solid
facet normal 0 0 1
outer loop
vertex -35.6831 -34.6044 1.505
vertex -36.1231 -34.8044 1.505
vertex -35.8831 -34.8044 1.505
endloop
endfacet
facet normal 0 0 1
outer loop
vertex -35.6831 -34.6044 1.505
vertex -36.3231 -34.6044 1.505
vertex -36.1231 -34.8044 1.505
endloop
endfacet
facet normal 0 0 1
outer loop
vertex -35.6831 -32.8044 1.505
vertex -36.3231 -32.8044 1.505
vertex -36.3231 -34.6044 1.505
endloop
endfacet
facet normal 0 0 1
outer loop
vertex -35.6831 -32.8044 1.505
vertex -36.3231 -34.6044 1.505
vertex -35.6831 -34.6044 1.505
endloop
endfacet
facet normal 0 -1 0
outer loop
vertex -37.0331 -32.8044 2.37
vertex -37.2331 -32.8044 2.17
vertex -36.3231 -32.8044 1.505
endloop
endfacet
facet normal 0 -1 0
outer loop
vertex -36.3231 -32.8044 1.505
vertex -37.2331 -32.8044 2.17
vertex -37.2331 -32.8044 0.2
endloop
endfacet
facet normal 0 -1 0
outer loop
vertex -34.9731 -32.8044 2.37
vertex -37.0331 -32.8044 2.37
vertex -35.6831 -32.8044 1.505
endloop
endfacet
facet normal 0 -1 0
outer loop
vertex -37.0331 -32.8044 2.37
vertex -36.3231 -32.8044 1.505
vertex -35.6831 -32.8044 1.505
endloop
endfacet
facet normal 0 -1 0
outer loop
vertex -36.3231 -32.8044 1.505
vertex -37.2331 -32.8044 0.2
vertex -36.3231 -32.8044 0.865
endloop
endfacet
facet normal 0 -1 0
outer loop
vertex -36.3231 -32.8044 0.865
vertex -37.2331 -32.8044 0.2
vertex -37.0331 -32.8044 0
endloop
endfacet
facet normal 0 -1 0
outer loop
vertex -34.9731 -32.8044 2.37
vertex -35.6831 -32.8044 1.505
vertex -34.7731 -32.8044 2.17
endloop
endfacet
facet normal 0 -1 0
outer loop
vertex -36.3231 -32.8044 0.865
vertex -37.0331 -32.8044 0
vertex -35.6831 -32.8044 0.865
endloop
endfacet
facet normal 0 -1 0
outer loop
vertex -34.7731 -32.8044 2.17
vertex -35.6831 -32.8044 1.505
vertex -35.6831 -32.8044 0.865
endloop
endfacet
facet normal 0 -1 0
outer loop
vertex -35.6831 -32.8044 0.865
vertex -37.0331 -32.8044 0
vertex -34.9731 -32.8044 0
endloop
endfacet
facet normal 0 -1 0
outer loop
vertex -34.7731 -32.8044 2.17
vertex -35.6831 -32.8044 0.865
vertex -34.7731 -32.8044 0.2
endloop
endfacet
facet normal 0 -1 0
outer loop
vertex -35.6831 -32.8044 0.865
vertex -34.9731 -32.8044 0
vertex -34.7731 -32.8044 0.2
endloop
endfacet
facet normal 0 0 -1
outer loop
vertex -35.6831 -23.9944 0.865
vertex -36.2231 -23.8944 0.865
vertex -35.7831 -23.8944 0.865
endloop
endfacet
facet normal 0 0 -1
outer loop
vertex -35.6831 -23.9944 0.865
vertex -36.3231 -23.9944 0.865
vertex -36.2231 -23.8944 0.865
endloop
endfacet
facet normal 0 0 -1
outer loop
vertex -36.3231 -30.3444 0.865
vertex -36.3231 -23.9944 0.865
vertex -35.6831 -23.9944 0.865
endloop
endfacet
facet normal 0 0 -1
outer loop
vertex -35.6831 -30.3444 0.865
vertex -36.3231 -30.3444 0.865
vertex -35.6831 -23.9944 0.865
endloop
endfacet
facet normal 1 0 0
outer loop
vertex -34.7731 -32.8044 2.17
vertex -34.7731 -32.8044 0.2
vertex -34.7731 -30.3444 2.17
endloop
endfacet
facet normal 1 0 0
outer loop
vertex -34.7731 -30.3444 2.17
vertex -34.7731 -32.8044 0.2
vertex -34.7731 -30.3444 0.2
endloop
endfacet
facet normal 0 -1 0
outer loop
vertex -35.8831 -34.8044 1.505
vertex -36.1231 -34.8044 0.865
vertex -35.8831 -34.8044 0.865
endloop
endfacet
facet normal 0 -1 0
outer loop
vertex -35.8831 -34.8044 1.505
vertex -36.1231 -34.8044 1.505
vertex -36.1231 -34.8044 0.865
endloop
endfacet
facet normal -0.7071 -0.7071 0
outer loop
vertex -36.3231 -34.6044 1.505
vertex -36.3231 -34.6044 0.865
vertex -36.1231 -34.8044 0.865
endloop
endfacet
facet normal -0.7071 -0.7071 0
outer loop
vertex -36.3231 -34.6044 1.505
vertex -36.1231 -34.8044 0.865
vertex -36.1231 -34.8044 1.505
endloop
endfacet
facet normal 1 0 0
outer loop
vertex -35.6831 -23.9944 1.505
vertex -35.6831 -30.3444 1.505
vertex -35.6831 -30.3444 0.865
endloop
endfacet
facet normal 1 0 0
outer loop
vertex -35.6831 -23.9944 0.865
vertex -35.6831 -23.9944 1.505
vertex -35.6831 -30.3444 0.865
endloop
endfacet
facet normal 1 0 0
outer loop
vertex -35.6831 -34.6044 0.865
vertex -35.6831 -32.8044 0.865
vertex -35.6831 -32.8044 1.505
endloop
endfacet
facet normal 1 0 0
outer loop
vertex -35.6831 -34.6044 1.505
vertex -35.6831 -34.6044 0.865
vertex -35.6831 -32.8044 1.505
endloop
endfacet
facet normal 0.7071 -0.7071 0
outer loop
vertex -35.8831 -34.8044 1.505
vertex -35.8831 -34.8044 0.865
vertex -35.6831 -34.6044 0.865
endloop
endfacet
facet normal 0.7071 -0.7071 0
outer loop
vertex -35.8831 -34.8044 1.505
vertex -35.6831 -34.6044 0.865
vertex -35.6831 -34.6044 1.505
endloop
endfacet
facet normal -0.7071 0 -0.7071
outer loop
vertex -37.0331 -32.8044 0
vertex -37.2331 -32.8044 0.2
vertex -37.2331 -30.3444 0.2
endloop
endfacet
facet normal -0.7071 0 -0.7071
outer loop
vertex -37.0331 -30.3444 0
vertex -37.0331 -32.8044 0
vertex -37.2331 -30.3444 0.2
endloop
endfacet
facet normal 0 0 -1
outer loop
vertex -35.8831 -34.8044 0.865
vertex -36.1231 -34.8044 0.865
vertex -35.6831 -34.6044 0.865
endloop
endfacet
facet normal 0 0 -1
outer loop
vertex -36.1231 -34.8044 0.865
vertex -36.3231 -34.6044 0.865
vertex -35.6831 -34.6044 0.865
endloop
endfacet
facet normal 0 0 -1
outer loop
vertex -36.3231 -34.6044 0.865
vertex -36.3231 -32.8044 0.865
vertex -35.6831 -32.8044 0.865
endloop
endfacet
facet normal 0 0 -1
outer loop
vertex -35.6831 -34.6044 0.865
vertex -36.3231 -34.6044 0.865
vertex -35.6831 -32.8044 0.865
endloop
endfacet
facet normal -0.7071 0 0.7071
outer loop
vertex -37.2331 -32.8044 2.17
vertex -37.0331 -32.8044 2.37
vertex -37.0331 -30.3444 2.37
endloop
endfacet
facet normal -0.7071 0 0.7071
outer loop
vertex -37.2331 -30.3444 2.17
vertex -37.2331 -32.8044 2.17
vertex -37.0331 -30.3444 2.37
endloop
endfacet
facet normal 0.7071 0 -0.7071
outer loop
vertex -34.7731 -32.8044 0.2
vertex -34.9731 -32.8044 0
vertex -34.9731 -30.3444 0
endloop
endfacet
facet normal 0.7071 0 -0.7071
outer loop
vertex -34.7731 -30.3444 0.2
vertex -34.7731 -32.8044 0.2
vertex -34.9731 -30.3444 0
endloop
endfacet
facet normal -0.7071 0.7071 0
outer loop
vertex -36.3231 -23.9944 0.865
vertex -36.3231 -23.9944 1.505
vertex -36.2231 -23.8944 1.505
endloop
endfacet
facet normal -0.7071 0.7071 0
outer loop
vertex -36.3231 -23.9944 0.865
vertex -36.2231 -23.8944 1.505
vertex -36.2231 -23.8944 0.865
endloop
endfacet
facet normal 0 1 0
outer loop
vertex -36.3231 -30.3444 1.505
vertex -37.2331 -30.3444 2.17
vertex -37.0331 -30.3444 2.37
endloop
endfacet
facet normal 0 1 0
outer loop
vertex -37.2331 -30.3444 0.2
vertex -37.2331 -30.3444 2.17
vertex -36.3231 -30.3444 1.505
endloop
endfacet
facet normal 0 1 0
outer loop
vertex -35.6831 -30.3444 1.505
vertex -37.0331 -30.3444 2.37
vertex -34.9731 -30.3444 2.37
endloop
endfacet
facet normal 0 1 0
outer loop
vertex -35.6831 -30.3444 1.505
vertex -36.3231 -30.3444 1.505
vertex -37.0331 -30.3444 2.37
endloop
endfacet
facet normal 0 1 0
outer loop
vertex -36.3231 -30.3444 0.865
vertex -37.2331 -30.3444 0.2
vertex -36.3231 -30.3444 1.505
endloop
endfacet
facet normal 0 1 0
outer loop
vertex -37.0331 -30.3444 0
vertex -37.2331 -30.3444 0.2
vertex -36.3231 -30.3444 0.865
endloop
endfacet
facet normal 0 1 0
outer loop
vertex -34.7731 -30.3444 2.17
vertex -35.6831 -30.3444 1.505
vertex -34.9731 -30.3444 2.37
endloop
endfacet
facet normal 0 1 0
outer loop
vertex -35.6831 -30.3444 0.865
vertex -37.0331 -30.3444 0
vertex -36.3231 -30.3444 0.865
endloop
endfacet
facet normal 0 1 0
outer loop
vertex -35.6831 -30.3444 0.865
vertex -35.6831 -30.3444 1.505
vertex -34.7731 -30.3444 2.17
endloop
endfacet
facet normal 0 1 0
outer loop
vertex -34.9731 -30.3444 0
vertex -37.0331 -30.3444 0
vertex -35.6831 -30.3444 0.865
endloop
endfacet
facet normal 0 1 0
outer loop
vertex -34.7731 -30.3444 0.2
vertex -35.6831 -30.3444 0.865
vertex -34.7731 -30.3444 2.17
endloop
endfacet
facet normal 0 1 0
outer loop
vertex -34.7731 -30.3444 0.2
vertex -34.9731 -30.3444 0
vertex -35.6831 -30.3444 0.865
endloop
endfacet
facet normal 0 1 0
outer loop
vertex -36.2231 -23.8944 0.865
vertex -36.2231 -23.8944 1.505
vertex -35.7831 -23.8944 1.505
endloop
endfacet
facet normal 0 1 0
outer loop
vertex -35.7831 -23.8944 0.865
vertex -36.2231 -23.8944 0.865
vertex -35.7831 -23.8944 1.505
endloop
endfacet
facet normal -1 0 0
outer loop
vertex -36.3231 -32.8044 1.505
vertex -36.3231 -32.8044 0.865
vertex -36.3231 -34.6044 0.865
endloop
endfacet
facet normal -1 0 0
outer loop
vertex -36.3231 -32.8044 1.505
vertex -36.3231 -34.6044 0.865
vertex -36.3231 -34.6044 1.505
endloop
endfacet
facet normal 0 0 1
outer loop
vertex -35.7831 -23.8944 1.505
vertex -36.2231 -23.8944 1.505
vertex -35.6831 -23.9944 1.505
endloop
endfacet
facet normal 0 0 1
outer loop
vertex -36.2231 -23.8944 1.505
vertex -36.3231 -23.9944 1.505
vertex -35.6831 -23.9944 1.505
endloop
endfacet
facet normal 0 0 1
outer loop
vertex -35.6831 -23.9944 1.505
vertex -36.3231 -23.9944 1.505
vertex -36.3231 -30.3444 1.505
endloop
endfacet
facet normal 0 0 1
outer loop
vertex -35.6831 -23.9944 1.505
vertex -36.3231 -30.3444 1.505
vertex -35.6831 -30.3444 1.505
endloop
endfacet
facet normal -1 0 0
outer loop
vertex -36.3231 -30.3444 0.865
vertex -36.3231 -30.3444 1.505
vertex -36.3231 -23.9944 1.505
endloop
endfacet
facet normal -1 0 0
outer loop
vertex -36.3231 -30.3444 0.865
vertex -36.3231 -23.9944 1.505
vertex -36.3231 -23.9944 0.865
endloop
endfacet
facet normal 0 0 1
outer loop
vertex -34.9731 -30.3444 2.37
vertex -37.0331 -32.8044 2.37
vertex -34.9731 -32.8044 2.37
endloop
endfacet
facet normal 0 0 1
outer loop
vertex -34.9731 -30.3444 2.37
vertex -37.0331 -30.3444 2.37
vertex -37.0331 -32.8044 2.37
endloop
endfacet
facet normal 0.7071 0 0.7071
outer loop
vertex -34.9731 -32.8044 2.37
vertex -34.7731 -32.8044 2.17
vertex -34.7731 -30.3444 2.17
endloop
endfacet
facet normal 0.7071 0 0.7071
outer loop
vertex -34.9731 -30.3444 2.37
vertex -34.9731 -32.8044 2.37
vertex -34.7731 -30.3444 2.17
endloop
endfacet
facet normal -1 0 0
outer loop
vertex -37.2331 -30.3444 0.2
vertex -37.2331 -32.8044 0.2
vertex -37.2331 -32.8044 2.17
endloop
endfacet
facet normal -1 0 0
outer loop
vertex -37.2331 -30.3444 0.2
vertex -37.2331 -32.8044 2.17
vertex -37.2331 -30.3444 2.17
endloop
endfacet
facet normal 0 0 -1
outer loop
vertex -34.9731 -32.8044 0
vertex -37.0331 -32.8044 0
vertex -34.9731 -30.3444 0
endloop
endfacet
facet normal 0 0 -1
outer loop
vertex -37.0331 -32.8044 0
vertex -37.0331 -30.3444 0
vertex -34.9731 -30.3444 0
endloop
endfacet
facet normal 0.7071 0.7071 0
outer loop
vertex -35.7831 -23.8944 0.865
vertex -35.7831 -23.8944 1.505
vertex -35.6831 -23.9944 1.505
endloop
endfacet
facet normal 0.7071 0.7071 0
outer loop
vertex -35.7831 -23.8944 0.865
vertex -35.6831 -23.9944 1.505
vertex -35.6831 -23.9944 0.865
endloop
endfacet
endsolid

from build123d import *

# Parameters (mm, degrees)
CROQUIS1_W              = 2.46
CROQUIS1_H              = 2.46
SALIENTE_EXTRUIR1_DEPTH = 2.37
CROQUIS2_W              = 0.64
CROQUIS2_H              = 0.64
SALIENTE_EXTRUIR2_DEPTH = 6.45
CROQUIS3_W              = 0.64
CROQUIS3_H              = 0.64
SALIENTE_EXTRUIR3_DEPTH = 2
CHAFL_N1_SIZE           = 0.2
CHAFL_N2_SIZE           = 0.2
CHAFL_N3_SIZE           = 0.2
CHAFL_N4_SIZE           = 0.2
CHAFL_N5_SIZE           = 0.1
CHAFL_N6_SIZE           = 0.1
CHAFL_N7_SIZE           = 0.2
CHAFL_N8_SIZE           = 0.2


with BuildPart() as part:
    # Croquis1 → Saliente-Extruir1 (new body)
    with BuildSketch(Plane.XY):
        with Locations((-36.003107302, -31.574436279)):
            Rectangle(CROQUIS1_W, CROQUIS1_H)
    extrude(amount=SALIENTE_EXTRUIR1_DEPTH)

    # Croquis2 → Saliente-Extruir2 (add)
    with BuildSketch(Plane(origin=(0, -30.344436279, 0), x_dir=(1, 0, 0), z_dir=(0, 1, 0))):
        with Locations((-36.003107302, -1.185)):
            Rectangle(CROQUIS2_W, CROQUIS2_H)
    extrude(amount=SALIENTE_EXTRUIR2_DEPTH)

    # Croquis3 → Saliente-Extruir3 (add)
    with BuildSketch(Plane.XZ.offset(32.804436279)):
        with Locations((-36.003107302, 1.185)):
            Rectangle(CROQUIS3_W, CROQUIS3_H)
    extrude(amount=SALIENTE_EXTRUIR3_DEPTH)

    # Chaflán1
    chafl_n1_edges = [part.edges().sort_by_distance(p)[0] for p in [
        (-37.233107302, -31.574436279, 2.37),
    ]]
    chamfer(chafl_n1_edges, length=CHAFL_N1_SIZE)

    # Chaflán2
    chafl_n2_edges = [part.edges().sort_by_distance(p)[0] for p in [
        (-34.773107302, -31.574436279, 2.37),
    ]]
    chamfer(chafl_n2_edges, length=CHAFL_N2_SIZE)

    # Chaflán3
    chafl_n3_edges = [part.edges().sort_by_distance(p)[0] for p in [
        (-34.773107302, -31.574436279, 0),
    ]]
    chamfer(chafl_n3_edges, length=CHAFL_N3_SIZE)

    # Chaflán4
    chafl_n4_edges = [part.edges().sort_by_distance(p)[0] for p in [
        (-37.233107302, -31.574436279, 0),
    ]]
    chamfer(chafl_n4_edges, length=CHAFL_N4_SIZE)

    # Chaflán5
    chafl_n5_edges = [part.edges().sort_by_distance(p)[0] for p in [
        (-35.683107302, -23.894436279, 1.185),
    ]]
    chamfer(chafl_n5_edges, length=CHAFL_N5_SIZE)

    # Chaflán6
    chafl_n6_edges = [part.edges().sort_by_distance(p)[0] for p in [
        (-36.323107302, -23.894436279, 1.185),
    ]]
    chamfer(chafl_n6_edges, length=CHAFL_N6_SIZE)

    # Chaflán7
    chafl_n7_edges = [part.edges().sort_by_distance(p)[0] for p in [
        (-35.683107302, -34.804436279, 1.185),
    ]]
    chamfer(chafl_n7_edges, length=CHAFL_N7_SIZE)

    # Chaflán8
    chafl_n8_edges = [part.edges().sort_by_distance(p)[0] for p in [
        (-36.323107302, -34.804436279, 1.185),
    ]]
    chamfer(chafl_n8_edges, length=CHAFL_N8_SIZE)


solid = part.part
